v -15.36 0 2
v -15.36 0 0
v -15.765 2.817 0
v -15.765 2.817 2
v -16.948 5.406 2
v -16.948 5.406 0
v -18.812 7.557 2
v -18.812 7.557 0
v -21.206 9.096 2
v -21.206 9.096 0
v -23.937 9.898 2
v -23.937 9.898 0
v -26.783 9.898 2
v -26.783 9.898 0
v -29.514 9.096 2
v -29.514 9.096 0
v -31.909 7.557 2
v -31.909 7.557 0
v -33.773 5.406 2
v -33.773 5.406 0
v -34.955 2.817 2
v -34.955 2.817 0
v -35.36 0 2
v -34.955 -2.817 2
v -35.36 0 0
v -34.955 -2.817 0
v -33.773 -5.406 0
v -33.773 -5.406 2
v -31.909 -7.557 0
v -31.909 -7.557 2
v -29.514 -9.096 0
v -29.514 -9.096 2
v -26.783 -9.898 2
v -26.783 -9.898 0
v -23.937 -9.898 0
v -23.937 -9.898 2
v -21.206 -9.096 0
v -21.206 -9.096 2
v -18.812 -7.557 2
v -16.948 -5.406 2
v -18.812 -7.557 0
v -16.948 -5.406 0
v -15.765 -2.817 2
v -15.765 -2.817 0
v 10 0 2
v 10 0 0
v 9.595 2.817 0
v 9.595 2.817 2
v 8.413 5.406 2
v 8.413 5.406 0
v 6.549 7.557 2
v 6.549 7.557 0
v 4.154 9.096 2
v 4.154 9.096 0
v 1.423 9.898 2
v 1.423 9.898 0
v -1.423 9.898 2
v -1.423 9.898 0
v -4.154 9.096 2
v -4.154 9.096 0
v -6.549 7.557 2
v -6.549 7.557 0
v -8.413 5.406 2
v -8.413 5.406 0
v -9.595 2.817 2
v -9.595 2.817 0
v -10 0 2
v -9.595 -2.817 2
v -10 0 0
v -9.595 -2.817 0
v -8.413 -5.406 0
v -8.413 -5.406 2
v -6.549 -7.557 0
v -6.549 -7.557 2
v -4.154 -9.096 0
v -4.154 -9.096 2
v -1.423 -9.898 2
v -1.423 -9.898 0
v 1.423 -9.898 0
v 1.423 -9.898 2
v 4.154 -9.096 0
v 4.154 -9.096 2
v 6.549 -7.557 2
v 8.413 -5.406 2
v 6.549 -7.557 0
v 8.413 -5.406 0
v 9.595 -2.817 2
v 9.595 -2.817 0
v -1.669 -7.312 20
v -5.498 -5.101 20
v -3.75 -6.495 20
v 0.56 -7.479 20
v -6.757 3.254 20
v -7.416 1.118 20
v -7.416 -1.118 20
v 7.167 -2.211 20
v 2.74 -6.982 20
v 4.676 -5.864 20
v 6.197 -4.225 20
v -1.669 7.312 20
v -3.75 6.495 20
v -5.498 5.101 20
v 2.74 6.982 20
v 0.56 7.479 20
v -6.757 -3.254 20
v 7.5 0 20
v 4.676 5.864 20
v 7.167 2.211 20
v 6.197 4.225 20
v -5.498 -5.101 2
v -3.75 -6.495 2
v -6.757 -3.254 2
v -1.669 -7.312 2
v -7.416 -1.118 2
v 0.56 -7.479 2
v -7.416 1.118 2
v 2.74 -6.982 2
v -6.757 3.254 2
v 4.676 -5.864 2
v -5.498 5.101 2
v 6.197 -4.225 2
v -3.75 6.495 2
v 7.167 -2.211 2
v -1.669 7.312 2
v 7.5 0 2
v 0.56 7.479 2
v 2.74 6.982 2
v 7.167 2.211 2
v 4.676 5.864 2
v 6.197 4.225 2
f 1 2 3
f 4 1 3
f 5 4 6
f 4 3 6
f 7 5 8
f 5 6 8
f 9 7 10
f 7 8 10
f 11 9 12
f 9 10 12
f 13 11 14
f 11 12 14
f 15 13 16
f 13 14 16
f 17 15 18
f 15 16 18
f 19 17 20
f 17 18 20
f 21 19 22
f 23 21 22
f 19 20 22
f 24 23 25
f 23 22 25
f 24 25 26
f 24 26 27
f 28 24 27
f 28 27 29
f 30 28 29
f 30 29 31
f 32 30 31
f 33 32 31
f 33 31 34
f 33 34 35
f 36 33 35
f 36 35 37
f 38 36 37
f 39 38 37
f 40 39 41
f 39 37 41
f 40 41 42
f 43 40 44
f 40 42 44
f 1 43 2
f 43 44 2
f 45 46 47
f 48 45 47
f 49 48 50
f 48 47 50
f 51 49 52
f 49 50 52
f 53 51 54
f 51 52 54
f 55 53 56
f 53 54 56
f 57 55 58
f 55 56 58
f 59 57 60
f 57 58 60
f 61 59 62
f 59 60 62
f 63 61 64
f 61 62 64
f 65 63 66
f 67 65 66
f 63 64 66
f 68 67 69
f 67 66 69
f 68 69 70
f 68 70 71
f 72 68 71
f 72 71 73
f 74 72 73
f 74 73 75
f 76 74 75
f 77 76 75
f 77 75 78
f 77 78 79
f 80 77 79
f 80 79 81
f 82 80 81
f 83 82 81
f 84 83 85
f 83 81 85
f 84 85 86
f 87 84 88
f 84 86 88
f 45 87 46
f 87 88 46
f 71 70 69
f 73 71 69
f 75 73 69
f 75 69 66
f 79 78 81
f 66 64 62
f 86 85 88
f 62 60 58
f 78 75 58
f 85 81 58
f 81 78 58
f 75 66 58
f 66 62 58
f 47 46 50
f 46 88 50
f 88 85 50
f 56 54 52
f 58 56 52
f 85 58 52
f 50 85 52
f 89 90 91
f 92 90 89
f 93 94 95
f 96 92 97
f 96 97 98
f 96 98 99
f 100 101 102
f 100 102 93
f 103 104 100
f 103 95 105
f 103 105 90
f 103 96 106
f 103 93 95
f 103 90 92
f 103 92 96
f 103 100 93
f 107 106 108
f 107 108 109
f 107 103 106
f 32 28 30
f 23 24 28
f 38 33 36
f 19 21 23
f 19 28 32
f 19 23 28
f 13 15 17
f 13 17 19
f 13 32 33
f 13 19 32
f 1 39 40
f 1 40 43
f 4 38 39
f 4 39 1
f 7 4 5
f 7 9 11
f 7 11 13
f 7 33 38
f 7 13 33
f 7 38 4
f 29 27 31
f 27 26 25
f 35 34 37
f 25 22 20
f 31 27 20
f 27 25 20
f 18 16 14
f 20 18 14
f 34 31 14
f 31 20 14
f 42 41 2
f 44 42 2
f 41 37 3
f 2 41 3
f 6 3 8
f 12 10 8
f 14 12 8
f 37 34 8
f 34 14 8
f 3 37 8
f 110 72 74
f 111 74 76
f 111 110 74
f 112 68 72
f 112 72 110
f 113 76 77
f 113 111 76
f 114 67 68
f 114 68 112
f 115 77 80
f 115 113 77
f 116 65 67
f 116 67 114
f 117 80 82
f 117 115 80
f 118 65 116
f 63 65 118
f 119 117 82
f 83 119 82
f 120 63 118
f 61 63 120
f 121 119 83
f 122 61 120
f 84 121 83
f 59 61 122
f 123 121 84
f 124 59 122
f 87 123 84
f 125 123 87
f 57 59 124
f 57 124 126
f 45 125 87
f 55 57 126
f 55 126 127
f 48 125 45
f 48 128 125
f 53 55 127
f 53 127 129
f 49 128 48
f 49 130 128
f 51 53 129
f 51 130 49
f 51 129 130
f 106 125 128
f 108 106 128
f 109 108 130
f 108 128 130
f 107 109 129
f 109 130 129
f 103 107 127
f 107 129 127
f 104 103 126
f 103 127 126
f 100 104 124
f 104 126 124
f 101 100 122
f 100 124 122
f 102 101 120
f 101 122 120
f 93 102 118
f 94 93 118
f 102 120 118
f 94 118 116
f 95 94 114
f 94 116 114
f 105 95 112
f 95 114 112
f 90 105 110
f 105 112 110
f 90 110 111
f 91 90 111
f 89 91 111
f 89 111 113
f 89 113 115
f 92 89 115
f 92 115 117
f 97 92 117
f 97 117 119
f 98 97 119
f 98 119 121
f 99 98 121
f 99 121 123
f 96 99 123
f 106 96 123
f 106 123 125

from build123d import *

# Parameters (mm, degrees)
F0_R     = 10
F1_DEPTH = 2
F2_R     = 7.5
F3_DEPTH = 20


# Not quite as in the source:
# - the program builds the solid bodies; features that only make, move or delete a surface that nothing else refers to are left out


with BuildPart() as f1:
    # F0 (on Top) → F1 (new body)
    with BuildSketch(Plane.XY):
        Circle(F0_R)
    extrude(amount=F1_DEPTH)

    # F2 (on Top) → F3 (join)
    with BuildSketch(Plane.XY):
        Circle(F2_R)
    extrude(amount=F3_DEPTH)


with BuildPart() as f1b:
    # F0 (on Top) → F1, piece 2 (new body)
    with BuildSketch(Plane.XY):
        with Locations((-25.3602210878, 0)):
            Circle(F0_R)
    extrude(amount=F1_DEPTH)


solid = Compound([f1.part, f1b.part])
